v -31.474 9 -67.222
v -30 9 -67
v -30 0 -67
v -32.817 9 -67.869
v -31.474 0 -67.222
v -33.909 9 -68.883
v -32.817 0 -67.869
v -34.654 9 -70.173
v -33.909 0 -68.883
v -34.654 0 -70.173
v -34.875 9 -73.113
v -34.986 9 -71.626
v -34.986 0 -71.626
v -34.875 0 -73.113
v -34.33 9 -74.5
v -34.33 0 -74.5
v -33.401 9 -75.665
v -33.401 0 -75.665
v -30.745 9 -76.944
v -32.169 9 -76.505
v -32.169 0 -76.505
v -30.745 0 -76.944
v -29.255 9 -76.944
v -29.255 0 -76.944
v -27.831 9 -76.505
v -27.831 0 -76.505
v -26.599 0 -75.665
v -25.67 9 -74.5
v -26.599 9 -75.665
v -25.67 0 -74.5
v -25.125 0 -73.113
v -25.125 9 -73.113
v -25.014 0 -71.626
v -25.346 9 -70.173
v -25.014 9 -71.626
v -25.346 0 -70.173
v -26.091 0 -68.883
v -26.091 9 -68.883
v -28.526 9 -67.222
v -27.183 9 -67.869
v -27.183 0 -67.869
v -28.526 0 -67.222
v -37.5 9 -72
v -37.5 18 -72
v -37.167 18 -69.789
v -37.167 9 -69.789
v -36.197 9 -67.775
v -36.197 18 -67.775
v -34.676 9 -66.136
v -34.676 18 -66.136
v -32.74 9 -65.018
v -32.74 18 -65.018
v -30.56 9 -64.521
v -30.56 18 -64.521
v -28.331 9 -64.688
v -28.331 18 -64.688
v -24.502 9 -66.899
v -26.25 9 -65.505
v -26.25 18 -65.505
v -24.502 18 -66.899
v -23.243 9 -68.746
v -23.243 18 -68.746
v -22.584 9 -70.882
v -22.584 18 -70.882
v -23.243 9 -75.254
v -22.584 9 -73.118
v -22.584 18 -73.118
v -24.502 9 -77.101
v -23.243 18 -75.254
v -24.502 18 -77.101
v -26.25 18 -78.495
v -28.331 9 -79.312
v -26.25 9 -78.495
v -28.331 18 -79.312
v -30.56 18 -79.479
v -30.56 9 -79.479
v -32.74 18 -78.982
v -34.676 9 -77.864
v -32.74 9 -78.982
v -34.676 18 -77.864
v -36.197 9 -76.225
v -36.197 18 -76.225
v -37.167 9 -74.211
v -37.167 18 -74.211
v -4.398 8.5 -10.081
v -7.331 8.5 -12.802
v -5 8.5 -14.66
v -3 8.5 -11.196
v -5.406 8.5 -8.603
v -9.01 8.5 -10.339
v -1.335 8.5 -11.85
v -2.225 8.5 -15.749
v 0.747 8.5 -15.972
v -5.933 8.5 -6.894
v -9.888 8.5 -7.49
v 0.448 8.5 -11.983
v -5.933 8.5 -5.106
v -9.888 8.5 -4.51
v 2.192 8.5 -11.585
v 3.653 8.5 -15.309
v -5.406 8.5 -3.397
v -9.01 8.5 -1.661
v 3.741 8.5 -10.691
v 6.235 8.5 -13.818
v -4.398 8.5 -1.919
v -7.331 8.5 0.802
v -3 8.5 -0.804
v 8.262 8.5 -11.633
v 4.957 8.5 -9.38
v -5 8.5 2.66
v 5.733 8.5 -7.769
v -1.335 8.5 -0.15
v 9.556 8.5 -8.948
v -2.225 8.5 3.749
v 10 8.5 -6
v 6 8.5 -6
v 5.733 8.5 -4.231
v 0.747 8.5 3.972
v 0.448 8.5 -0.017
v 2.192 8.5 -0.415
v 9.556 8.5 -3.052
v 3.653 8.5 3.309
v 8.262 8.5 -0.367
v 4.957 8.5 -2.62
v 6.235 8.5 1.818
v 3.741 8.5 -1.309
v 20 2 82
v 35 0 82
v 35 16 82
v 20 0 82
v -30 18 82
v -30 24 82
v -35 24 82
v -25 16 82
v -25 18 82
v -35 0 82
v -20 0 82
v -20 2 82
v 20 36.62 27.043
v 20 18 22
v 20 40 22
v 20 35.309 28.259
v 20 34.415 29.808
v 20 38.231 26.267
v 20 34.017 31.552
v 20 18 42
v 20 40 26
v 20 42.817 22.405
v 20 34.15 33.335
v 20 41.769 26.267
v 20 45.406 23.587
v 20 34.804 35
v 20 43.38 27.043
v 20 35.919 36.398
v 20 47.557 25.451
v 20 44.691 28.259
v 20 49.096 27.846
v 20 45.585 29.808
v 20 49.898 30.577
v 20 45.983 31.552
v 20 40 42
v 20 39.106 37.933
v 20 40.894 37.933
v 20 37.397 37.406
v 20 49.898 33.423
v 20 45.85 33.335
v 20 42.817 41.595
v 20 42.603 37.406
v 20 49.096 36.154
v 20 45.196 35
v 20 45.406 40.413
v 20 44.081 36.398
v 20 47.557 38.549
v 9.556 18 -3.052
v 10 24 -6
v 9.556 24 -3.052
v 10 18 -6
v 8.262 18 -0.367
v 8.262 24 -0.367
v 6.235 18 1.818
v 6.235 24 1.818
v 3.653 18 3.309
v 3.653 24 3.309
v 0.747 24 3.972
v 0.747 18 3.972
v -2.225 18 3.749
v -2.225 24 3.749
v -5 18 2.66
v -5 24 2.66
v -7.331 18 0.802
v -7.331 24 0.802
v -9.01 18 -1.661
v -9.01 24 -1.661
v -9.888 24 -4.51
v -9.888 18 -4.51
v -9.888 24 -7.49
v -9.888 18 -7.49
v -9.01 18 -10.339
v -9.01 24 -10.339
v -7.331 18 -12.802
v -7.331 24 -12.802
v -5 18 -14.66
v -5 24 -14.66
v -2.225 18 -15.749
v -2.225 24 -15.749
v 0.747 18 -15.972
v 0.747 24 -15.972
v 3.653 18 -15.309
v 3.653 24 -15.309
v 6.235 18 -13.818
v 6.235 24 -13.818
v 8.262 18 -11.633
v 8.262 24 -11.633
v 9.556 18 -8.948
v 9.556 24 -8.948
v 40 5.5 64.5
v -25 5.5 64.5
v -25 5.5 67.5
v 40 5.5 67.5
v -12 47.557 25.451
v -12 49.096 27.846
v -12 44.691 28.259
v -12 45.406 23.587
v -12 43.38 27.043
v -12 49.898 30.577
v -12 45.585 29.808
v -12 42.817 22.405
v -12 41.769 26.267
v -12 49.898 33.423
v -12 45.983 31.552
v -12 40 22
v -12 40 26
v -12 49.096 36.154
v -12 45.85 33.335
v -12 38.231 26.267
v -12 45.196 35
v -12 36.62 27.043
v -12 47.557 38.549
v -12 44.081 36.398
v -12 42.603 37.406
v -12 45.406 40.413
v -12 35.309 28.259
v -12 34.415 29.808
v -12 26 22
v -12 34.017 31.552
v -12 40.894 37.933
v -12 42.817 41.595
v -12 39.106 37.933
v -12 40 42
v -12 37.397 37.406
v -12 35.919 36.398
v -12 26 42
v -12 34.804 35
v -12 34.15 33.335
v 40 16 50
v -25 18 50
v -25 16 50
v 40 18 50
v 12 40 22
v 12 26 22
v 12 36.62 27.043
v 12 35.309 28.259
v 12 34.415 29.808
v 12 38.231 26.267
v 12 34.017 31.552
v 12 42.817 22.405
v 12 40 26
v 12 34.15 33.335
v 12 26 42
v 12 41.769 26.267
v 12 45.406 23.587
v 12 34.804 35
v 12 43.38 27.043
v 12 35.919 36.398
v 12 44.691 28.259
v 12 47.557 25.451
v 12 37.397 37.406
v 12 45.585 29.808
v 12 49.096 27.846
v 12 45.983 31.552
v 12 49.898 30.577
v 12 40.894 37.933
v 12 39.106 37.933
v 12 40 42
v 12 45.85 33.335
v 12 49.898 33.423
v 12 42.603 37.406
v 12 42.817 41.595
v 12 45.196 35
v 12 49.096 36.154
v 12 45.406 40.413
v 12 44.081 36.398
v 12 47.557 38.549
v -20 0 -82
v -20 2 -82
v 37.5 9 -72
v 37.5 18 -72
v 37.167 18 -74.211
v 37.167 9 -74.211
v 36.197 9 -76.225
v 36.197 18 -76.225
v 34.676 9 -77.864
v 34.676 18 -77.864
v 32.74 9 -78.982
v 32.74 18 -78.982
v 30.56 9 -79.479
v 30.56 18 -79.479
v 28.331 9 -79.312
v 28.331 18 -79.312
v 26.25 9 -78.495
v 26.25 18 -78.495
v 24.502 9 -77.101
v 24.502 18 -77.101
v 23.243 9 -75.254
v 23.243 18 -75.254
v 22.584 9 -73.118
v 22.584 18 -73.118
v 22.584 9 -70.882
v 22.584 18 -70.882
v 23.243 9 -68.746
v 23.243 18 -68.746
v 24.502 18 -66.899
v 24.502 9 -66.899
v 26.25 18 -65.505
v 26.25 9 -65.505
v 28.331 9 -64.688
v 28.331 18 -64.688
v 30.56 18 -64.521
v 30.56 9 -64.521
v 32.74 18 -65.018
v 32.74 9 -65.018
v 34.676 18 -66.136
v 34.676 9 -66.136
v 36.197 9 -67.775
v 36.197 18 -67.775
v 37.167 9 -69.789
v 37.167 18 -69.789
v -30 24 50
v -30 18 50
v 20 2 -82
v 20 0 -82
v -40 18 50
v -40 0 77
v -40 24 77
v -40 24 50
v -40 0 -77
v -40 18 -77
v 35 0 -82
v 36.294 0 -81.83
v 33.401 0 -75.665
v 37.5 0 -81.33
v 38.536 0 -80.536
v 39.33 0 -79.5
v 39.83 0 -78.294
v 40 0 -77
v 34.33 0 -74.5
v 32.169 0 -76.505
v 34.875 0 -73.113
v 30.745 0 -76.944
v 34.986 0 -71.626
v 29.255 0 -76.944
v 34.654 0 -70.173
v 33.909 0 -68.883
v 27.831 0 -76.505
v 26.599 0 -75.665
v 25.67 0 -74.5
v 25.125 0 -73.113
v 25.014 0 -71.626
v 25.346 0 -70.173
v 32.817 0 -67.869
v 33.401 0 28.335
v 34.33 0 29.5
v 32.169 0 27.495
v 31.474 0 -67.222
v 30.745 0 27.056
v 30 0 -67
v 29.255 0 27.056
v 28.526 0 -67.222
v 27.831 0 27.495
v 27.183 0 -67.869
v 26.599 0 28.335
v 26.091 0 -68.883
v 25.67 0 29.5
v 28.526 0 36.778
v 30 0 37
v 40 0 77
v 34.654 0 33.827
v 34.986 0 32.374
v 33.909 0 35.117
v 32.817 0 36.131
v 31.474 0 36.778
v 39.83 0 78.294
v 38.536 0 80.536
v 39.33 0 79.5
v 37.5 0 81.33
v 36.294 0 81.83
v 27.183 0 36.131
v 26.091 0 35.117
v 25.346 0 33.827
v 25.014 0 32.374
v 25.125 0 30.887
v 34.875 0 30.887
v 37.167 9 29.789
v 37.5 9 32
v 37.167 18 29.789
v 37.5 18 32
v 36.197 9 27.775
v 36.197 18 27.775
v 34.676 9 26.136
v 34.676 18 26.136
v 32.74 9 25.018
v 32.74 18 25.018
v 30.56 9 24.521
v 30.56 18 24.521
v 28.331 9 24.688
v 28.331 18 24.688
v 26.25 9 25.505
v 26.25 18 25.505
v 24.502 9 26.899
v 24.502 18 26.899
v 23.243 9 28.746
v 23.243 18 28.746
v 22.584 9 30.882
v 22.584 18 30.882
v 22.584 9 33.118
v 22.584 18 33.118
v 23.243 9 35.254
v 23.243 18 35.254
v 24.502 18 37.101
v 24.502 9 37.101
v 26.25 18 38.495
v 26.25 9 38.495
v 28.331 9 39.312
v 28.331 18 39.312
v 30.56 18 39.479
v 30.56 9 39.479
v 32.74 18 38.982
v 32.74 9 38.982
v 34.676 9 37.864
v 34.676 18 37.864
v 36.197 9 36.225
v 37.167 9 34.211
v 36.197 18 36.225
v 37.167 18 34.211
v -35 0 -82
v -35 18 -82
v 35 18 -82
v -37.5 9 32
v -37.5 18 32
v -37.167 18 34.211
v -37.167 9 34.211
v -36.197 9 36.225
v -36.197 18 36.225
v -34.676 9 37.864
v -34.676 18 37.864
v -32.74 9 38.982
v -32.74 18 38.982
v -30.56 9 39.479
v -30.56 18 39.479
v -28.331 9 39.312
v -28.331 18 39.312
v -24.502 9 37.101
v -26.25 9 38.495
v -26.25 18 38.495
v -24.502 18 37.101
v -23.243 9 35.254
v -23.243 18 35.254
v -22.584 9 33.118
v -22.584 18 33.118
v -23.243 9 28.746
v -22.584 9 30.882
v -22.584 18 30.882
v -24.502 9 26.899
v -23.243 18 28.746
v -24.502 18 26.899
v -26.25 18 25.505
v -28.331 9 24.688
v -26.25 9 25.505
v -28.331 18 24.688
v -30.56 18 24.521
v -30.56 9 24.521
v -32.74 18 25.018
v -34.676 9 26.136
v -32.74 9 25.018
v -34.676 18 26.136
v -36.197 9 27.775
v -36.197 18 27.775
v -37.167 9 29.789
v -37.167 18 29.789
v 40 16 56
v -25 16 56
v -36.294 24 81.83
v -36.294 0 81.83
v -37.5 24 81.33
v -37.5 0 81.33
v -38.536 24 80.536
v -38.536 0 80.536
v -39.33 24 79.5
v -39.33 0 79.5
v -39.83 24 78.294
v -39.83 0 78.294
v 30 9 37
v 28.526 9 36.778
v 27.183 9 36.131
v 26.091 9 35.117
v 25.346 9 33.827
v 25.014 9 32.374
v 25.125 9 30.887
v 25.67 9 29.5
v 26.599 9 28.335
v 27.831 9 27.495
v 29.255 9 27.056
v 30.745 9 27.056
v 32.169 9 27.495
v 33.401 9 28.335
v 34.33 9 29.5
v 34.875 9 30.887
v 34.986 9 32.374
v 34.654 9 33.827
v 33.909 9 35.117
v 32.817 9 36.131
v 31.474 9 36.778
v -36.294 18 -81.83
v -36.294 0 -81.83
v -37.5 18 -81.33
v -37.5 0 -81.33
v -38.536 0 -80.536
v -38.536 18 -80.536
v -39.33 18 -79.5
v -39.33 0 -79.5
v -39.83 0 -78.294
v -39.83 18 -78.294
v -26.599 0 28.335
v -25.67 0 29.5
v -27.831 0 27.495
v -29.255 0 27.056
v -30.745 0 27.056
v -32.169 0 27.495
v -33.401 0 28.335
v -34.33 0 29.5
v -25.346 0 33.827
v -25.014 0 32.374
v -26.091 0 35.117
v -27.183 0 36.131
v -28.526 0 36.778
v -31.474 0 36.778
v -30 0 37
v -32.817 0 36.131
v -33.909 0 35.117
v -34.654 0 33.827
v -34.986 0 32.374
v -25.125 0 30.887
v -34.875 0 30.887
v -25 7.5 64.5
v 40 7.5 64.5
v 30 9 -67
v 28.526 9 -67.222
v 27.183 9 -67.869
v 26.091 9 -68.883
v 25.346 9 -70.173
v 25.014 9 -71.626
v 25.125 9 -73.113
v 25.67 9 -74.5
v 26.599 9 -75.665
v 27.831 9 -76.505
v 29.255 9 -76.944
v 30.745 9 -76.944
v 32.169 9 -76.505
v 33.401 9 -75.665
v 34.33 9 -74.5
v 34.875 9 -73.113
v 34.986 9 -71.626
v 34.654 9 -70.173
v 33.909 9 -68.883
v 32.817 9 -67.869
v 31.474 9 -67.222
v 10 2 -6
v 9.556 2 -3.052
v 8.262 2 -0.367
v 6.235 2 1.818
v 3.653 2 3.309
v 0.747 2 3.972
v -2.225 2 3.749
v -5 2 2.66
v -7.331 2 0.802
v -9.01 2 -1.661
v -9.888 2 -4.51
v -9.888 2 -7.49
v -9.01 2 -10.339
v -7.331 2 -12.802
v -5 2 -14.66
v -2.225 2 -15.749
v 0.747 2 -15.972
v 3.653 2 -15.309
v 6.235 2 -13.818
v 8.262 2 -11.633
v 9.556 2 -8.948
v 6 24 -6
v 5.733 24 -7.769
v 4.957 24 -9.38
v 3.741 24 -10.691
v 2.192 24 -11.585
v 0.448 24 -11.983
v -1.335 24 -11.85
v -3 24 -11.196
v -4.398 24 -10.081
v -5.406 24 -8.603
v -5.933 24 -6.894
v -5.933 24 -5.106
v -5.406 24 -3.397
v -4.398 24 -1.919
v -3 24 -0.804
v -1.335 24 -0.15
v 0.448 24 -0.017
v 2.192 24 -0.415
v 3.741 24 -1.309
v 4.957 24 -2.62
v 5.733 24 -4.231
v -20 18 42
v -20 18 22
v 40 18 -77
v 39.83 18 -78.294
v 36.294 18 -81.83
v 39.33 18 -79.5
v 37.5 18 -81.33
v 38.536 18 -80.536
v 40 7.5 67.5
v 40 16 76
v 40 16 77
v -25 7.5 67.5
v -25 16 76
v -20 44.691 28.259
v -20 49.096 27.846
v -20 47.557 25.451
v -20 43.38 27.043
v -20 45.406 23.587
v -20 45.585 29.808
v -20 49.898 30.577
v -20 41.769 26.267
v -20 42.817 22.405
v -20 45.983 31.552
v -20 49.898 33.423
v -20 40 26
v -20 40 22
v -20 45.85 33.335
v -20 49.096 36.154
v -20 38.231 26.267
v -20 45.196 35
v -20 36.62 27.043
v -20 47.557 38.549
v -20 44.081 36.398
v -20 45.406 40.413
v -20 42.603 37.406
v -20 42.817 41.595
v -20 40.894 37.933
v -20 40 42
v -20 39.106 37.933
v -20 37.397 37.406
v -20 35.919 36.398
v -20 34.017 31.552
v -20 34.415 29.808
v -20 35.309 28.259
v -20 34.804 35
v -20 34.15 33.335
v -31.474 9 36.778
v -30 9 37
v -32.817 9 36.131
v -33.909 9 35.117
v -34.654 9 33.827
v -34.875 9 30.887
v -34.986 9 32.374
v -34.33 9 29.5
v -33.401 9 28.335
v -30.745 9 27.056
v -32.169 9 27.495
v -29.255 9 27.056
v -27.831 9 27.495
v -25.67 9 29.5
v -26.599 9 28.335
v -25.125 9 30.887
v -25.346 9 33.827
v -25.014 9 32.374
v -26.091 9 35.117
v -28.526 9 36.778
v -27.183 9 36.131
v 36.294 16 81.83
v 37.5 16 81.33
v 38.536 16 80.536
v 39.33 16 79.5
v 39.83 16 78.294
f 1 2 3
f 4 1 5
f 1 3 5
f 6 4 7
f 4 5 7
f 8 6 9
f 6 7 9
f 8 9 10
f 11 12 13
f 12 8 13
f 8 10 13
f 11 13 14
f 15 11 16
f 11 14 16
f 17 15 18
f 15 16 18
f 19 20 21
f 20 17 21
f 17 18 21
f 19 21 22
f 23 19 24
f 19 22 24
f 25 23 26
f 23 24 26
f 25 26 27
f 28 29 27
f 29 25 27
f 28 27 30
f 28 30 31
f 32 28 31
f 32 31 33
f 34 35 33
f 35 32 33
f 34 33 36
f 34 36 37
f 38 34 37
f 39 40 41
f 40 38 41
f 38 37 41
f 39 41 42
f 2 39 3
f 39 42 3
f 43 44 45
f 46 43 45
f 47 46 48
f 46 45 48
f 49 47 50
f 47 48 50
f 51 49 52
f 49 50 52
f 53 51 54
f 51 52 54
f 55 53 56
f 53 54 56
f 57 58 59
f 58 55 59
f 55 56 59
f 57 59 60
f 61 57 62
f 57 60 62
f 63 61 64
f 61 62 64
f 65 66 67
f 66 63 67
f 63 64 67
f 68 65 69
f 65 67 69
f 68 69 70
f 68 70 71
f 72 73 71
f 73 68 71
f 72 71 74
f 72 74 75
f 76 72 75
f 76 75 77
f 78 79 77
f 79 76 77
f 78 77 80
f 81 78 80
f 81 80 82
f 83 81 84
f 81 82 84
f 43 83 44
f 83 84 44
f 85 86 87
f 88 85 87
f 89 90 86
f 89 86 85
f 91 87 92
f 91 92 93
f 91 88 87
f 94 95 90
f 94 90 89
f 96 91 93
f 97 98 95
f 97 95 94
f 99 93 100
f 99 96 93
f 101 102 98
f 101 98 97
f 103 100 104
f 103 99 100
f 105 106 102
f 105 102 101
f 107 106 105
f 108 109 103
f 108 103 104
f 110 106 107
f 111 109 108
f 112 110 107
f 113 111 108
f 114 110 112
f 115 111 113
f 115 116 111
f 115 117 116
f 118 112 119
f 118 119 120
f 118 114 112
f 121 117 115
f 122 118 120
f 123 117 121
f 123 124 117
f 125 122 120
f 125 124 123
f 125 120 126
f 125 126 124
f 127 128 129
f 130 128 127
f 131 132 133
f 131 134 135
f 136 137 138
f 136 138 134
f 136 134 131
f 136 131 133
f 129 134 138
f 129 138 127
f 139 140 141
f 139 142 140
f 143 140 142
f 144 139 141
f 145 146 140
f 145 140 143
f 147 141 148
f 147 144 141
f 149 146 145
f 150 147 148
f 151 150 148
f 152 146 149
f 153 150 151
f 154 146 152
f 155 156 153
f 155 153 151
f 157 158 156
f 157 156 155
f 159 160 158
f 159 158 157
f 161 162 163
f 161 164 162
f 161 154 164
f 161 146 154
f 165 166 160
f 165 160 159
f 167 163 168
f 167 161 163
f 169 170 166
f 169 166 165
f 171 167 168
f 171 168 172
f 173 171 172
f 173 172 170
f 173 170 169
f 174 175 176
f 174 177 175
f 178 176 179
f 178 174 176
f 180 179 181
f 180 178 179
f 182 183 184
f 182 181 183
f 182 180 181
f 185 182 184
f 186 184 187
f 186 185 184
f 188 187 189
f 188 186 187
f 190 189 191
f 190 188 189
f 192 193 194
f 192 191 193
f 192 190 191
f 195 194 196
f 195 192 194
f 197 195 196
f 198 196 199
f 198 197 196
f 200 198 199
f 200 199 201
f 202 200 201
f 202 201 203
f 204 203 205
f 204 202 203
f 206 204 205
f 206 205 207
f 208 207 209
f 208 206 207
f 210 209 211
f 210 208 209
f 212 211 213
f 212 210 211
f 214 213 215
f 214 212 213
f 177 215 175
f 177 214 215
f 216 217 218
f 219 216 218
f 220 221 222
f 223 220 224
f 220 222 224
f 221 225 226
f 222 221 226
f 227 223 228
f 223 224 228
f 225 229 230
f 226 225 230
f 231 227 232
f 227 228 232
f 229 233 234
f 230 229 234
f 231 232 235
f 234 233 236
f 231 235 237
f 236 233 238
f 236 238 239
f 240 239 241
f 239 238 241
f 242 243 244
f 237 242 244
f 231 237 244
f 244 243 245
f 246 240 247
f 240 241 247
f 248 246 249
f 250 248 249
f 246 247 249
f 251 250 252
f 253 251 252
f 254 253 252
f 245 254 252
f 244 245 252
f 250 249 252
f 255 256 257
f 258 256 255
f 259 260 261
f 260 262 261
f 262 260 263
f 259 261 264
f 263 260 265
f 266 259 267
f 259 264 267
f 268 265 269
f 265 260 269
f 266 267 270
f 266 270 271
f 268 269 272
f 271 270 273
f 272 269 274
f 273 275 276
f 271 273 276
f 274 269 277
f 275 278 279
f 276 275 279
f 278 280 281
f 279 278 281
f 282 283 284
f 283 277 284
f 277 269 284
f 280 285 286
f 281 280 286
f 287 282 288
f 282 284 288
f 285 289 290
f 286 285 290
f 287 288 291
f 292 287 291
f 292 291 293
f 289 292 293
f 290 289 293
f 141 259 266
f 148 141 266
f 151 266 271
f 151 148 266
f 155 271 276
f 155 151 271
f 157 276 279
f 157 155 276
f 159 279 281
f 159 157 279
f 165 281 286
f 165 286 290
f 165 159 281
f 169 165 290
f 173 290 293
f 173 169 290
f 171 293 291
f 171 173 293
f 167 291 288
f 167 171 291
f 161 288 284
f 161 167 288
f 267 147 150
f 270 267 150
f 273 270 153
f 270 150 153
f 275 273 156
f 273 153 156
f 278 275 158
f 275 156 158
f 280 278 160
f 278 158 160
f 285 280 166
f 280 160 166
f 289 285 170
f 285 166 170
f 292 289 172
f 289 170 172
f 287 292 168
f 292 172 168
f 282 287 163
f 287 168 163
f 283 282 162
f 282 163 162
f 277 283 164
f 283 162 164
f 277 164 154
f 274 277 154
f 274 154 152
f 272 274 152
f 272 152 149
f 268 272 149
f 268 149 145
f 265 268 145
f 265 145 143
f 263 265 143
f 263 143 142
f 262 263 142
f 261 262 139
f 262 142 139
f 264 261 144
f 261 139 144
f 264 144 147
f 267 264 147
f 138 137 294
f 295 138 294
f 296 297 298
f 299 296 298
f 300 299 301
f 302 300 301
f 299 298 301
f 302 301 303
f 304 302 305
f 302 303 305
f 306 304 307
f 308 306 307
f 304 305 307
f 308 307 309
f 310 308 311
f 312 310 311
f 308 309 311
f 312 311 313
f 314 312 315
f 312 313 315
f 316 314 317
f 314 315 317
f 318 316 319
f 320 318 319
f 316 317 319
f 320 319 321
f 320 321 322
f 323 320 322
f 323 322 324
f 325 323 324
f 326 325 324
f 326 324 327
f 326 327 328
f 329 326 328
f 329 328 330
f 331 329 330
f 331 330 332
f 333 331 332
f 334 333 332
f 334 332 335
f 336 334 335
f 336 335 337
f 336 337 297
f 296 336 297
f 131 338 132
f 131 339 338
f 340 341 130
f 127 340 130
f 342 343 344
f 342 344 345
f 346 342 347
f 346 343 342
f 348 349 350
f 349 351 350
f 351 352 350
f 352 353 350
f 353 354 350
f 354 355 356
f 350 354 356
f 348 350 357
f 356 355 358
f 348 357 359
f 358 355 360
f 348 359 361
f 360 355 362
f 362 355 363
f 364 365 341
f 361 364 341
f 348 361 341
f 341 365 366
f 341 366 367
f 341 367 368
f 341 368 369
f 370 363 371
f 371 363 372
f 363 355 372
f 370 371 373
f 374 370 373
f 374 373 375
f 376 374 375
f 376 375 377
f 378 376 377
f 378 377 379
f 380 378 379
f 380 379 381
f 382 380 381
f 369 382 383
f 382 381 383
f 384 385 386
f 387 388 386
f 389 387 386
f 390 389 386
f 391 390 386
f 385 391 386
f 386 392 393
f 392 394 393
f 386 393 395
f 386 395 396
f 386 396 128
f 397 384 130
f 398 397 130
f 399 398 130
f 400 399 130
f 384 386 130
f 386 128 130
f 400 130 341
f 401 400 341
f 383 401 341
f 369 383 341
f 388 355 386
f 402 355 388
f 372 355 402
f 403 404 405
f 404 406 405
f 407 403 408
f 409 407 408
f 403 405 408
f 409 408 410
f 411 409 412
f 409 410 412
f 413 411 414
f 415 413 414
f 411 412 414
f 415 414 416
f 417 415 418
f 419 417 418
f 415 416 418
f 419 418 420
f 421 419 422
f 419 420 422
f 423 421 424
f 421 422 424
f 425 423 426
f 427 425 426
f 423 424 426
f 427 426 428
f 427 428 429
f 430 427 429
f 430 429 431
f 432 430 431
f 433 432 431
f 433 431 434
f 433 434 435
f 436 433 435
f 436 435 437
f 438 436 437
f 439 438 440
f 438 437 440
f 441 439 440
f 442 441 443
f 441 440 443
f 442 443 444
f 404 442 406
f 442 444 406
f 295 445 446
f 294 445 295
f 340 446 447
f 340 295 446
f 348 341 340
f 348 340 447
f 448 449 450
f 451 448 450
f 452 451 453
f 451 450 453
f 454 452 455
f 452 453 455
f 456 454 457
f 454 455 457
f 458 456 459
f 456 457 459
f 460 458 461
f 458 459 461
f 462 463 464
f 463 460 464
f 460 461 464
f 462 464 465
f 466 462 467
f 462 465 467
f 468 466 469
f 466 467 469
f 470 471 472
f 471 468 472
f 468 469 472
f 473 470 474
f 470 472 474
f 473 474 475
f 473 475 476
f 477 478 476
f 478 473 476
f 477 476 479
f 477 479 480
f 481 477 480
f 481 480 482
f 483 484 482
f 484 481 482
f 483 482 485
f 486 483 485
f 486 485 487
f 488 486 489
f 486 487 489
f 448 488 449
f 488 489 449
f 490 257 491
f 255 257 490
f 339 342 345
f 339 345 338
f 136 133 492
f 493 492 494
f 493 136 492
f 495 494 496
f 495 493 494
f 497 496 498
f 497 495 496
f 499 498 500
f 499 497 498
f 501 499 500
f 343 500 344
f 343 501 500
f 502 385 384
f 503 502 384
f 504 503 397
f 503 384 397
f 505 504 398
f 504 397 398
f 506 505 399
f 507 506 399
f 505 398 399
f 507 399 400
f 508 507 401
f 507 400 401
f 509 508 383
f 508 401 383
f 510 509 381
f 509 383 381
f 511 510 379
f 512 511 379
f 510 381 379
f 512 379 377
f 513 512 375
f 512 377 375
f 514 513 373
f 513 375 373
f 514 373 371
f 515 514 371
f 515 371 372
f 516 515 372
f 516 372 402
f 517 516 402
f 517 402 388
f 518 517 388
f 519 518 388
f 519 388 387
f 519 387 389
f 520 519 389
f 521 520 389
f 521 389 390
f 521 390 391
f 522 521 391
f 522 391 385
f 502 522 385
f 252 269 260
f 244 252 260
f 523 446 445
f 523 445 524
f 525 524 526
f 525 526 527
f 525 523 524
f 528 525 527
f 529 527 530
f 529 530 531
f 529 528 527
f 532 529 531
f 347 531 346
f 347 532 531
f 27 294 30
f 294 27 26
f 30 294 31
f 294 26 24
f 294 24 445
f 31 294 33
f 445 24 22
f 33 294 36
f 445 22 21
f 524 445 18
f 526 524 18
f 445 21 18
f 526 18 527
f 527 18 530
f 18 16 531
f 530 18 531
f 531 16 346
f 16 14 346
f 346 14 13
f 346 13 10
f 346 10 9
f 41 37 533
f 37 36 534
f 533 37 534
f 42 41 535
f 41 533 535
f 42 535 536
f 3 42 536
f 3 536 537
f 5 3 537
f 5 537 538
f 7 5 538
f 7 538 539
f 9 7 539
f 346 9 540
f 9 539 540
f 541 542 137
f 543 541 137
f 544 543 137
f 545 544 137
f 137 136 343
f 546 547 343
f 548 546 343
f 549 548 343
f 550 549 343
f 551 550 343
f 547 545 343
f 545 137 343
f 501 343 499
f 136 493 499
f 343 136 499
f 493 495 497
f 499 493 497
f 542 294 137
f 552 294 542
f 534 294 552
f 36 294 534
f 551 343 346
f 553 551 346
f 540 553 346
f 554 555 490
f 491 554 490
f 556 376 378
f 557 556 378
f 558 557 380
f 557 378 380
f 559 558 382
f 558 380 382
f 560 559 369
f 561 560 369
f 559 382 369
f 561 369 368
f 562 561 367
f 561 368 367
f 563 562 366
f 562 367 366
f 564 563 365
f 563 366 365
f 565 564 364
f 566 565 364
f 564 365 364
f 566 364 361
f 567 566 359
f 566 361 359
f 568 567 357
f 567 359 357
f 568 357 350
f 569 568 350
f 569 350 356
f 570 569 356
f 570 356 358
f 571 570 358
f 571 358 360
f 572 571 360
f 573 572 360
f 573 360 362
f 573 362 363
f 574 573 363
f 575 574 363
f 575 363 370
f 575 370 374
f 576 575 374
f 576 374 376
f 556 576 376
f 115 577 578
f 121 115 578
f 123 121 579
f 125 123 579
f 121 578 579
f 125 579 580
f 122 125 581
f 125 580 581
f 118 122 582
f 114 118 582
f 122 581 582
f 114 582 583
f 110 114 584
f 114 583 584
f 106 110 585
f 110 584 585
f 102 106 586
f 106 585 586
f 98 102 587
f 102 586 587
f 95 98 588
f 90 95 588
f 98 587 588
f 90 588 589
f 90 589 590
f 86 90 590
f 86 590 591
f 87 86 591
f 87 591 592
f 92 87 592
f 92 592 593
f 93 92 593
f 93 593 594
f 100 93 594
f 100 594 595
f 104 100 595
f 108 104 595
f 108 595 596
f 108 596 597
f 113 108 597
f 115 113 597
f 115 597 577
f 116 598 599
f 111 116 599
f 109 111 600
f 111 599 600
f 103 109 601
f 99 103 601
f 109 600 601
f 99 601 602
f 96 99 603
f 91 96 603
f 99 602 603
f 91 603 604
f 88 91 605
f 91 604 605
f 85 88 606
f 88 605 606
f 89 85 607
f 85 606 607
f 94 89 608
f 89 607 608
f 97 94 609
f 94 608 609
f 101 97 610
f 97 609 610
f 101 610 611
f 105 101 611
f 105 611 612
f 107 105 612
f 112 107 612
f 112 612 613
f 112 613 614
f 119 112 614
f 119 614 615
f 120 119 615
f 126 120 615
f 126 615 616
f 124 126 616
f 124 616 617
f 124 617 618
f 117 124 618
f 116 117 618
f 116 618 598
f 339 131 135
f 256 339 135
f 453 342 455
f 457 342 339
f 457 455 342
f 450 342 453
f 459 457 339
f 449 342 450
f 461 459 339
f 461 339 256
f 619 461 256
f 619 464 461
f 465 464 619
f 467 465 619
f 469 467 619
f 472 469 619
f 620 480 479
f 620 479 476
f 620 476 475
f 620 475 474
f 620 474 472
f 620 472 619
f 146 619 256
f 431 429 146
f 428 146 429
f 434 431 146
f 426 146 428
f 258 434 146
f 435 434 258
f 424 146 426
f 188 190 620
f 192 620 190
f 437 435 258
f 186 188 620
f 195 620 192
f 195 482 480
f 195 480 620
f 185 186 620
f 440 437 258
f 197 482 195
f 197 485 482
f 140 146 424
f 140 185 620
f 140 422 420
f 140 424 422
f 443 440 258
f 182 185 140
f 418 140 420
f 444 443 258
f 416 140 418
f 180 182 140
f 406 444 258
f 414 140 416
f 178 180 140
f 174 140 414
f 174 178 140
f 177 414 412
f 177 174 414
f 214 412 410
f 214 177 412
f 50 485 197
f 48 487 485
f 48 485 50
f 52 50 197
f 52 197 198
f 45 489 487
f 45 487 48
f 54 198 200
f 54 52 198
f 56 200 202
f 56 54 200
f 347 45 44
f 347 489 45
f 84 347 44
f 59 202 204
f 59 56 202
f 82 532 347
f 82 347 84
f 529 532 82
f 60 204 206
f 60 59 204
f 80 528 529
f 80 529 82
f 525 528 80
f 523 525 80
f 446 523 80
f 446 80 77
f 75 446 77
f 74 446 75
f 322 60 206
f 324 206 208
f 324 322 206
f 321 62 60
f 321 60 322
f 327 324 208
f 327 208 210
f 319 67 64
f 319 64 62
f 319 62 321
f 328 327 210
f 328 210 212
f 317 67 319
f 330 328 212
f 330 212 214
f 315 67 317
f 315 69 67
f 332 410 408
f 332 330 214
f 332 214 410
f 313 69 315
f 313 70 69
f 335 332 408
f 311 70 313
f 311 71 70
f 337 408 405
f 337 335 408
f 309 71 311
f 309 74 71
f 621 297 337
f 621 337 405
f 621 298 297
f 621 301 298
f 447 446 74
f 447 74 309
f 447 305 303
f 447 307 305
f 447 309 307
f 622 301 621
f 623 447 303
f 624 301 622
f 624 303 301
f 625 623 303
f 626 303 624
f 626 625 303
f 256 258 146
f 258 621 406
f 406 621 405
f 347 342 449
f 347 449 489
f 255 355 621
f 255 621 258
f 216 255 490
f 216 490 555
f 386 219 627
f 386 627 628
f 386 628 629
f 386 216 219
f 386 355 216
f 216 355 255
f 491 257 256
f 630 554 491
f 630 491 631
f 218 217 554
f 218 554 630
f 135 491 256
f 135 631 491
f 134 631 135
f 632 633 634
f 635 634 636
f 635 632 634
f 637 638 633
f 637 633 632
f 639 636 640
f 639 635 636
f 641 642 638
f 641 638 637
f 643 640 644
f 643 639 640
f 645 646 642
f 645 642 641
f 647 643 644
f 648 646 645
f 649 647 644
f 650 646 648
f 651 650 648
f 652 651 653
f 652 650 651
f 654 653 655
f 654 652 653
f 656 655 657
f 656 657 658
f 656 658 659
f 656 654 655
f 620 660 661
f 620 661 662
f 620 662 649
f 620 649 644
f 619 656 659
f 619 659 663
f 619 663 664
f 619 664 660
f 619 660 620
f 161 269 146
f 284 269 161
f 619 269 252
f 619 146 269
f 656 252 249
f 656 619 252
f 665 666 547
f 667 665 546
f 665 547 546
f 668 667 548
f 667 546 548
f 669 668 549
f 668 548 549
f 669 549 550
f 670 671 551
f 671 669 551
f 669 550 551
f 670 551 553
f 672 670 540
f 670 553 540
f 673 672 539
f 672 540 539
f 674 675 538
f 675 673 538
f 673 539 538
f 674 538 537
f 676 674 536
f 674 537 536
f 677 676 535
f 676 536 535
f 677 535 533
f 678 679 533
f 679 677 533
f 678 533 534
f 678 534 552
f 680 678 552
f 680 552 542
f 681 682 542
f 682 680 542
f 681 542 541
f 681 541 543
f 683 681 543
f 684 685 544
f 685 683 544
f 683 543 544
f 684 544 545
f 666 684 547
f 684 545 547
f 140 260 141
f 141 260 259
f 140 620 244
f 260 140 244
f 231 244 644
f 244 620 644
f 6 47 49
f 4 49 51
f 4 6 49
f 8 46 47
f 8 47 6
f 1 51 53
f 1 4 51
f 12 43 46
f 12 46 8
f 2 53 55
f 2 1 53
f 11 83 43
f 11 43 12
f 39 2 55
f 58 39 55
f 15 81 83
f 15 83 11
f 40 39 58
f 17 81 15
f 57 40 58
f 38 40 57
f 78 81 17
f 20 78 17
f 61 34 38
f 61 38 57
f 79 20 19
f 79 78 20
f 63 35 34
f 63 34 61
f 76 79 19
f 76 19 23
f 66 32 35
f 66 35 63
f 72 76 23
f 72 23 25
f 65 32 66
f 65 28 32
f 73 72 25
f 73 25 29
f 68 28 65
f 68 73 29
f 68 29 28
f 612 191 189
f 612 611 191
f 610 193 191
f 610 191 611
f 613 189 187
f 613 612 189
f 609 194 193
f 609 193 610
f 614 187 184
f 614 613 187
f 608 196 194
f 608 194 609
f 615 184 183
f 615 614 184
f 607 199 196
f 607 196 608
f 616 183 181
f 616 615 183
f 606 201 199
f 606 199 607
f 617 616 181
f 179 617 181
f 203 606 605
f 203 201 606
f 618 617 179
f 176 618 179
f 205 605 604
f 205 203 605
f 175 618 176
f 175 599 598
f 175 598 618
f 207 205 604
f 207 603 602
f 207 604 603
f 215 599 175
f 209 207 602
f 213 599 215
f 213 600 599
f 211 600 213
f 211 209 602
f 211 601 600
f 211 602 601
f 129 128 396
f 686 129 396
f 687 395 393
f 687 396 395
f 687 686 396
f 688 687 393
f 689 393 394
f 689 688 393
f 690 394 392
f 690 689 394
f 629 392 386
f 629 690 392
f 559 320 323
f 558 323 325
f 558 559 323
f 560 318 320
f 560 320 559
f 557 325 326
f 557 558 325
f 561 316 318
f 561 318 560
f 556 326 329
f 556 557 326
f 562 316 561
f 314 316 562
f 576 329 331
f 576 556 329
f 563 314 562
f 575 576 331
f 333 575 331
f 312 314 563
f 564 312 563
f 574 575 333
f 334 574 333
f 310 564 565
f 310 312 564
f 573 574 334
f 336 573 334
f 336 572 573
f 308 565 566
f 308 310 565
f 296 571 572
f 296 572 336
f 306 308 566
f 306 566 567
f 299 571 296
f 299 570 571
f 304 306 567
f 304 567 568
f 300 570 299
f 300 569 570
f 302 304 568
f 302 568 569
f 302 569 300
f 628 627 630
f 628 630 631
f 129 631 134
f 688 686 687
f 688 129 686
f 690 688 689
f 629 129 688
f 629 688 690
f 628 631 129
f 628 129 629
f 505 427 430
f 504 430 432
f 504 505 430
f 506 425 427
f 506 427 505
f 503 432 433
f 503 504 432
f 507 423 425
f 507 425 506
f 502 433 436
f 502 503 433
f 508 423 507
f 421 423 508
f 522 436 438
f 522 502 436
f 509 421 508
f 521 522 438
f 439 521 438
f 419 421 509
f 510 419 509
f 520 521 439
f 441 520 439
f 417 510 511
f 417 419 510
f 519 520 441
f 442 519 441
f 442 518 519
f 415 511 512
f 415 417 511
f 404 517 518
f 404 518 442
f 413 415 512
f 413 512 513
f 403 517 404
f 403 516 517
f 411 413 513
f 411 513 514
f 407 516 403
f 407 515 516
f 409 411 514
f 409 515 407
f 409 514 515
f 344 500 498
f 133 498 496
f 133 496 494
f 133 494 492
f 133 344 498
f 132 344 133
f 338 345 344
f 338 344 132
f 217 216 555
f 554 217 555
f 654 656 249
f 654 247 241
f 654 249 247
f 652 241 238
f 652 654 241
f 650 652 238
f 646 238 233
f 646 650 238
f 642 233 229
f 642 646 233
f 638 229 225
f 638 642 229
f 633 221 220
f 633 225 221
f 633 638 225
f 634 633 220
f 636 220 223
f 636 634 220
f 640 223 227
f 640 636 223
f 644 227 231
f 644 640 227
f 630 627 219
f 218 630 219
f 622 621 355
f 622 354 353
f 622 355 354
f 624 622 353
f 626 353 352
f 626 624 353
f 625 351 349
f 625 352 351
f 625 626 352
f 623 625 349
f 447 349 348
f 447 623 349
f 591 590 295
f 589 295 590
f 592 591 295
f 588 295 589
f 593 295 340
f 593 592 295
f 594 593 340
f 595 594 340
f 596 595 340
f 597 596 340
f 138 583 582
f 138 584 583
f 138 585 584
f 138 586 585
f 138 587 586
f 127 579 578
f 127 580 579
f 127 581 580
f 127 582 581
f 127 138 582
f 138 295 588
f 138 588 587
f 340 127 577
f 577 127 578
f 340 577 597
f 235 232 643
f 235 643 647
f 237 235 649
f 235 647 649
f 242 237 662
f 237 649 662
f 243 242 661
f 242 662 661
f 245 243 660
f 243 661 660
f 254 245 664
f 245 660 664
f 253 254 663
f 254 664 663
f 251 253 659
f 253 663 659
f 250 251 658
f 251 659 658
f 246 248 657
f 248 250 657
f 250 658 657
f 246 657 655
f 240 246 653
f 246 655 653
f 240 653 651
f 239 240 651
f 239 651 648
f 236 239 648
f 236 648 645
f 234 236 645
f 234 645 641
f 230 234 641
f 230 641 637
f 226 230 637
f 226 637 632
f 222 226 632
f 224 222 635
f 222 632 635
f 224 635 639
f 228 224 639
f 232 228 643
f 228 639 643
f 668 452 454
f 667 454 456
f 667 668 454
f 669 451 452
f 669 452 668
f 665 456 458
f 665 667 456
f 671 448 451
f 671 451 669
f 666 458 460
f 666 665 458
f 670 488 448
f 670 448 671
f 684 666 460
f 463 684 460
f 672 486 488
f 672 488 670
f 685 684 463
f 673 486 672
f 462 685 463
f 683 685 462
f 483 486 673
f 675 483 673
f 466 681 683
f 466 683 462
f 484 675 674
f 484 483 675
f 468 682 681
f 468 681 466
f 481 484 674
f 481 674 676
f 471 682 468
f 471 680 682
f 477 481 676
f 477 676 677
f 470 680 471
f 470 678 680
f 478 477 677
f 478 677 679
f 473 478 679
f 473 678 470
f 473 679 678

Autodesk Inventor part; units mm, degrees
ref_plane "XZ Plane" through (0, 0, 0) normal (0, 1, 0) x (-1, 0, 0)
ref_plane "XY Plane" through (0, 0, 0) normal (0, 0, 1) x (1, 0, 0)
sketch "草图1" plane through (0, 0, 0) normal (0, 1, 0) x (-1, 0, 0)
  line L0 (40, -82) -> (-40, -82)
  line L1 (-40, -82) -> (-40, 82)
  line L2 (-40, 82) -> (40, 82)
  line L3 (40, 82) -> (40, -82)
  line L4 (40, -82) -> (-40, 82) construction
  line L5 (-40, -82) -> (40, 82) construction
  point P0 (0, 0)
  dimension "d0" = 80
  dimension "d1" = 164
extrude "拉伸1" add sketch "草图1" along normal blind 18
sketch "草图2" plane through (0, 18, 0) normal (0, 1, 0) x (1, 0, 0)
  line L0 (-40, -82) -> (40, -82) projected
  line L1 (-40, 82) -> (-40, -82) projected
  line L2 (-40, -82) -> (-40, -50)
  line L3 (-40, -50) -> (40, -50)
  line L4 (40, -50) -> (40, -82)
  line L5 (40, -82) -> (-40, -82)
  point P0 (0, 0)
  dimension "d4" = 32
extrude "拉伸2" cut sketch "草图2" against normal blind 2
fillet "圆角1" radius 5 4 edges at (40, 8, 82) (40, 9, -82) (-40, 8, 82) (-40, 9, -82)
sketch "草图4" plane through (0, 0, 0) normal (1, 0, 0) x (0, 1, 0)
  line L0 (0, 82) -> (16, 82) projected
  line L1 (5.5, 66) -> (5.5, 64.5)
  line L2 (5.5, 64.5) -> (5.5, 67.5)
  line L3 (5.5, 64.5) -> (7.5, 64.5)
  line L4 (7.5, 67.5) -> (5.5, 67.5)
  line L5 (7.5, 64.5) -> (16, 56)
  line L6 (16, 77) -> (16, 50) projected
  line L7 (7.5, 67.5) -> (16, 76)
  line L8 (16, 76) -> (16, 56)
  line L9 (5.5, 66) -> (6, 66)
  point P0 (0, 0)
  dimension "d15" = 16
  dimension "d16" = 1.5
  dimension "d17" = 3
  dimension "d18" = 2
extrude "拉伸3" cut sketch "草图4" along normal blind 40 and the other way blind 25
sketch "草图6" plane through (0, 16, 0) normal (0, 1, 0) x (1, 0, 0)
  line L0 (40, -76) -> (-25, -76) projected
  line L1 (-25, -76) -> (-25, -56) projected
  line L2 (-25, -56) -> (40, -56) projected
  line L3 (40, -50) -> (40, -56) projected
  line L4 (-40, -50) -> (40, -50) projected
  line L5 (-40, -77) -> (-40, -50) projected
  arc A0 (-40, -77) -> (-35, -82) centre (-35, -77) ccw projected
  line L6 (35, -82) -> (-35, -82) projected
  arc A1 (35, -82) -> (40, -77) centre (35, -77) ccw projected
  line L7 (40, -76) -> (40, -77) projected
  line L8 (-40, -50) -> (40, -50) projected
  line L9 (-40, -50) -> (-30, -50)
  line L10 (-30, -50) -> (-30, -82)
  line L11 (-35, -82) -> (35, -82) projected
  point P0 (0, 0)
  dimension "d27" = 10
extrude "拉伸5" add sketch "草图6" along normal blind 8 contours L6 A0 L5 L4 L10
sketch "草图7" plane through (0, 16, 0) normal (0, 1, 0) x (1, 0, 0)
  line L0 (-30, -50) -> (-30, -82) projected
  line L1 (35, -82) -> (-30, -82) projected
  arc A0 (35, -82) -> (40, -77) centre (35, -77) ccw projected
  line L2 (40, -76) -> (40, -77) projected
  line L3 (40, -76) -> (-25, -76) projected
  line L4 (-25, -76) -> (-25, -56) projected
  line L5 (-25, -56) -> (40, -56) projected
  line L6 (40, -50) -> (40, -56) projected
  line L7 (-30, -50) -> (40, -50) projected
  line L8 (-30, -50) -> (40, -50) projected
  line L9 (-25, -50) -> (-25, -82)
  line L10 (35, -82) -> (-30, -82) projected
  point P0 (0, 0)
extrude "拉伸6" add sketch "草图7" along normal blind 2 contours L7 L9 L4 L1 L0
sketch "草图8" plane through (0, 18, 0) normal (0, 1, 0) x (1, 0, 0)
  circle A0 centre (30, -32) radius 7.5
  line L0 (35, -82) -> (-25, -82) projected
  line L1 (40, -50) -> (40, 77) projected
  circle A1 centre (30, 72) radius 7.5
  line L2 (35, 82) -> (-35, 82) projected
  point P0 (0, 0)
  dimension "d32" = 15
  dimension "d34" = 10
  dimension "d35" = 15
  dimension "d36" = 10
  dimension "d38" = 50
extrude "拉伸7" cut sketch "草图8" against normal blind 9
sketch "草图9" plane through (30, 9, -72) normal (0, 1, 0) x (1, 0, 0)
  circle A0 centre (0, 0) radius 7.5 projected
  circle A1 centre (0, -104) radius 7.5 projected
  point P0 (-30, -72)
hole "孔1" at (30, 9, -72) at (30, 9, 32) direction (0, -1, 0) diameter 10 end through all
mirror "镜像1" about plane through (0, 0, 0) normal (1, 0, 0) of "拉伸7", "孔1"
sketch "草图11" plane through (0, 18, 0) normal (0, 1, 0) x (1, 0, 0)
  circle A0 centre (0, 6) radius 10
  line L0 (35, -82) -> (-25, -82) projected
  point P0 (0, 0)
  dimension "d50" = 20
  dimension "d51" = 88
extrude "拉伸8" add sketch "草图11" along normal blind 6
sketch "草图12" plane through (0, 24, -6) normal (0, 1, 0) x (1, 0, 0)
  circle A0 centre (0, 0) radius 6
  point P0 (0, -6)
  dimension "d54" = 12
extrude "拉伸9" cut sketch "草图12" against normal blind 15.5
sketch "草图13" plane through (0, 0, 0) normal (0, -1, 0) x (1, 0, 0)
  circle A0 centre (-30, -72) radius 5 projected
  circle A1 centre (-30, 32) radius 5 projected
  circle A2 centre (30, -72) radius 5 projected
  circle A3 centre (30, 32) radius 5 projected
  arc A4 (-40, -77) -> (-35, -82) centre (-35, -77) ccw projected
  line L0 (35, -82) -> (-35, -82) projected
  arc A5 (35, -82) -> (40, -77) centre (35, -77) ccw projected
  line L1 (40, 77) -> (40, -77) projected
  arc A6 (40, 77) -> (35, 82) centre (35, 77) ccw projected
  line L2 (-35, 82) -> (35, 82) projected
  arc A7 (-35, 82) -> (-40, 77) centre (-35, 77) ccw projected
  line L3 (-40, -77) -> (-40, 77) projected
  circle A8 centre (0, -6) radius 10
  point P0 (0, 0)
  dimension "d57" = 20
  dimension "d58" = 88
extrude "拉伸10" cut sketch "草图13" against normal up to surface (8.5 mm away) contours A8
ref_plane "工作平面1" through (20, 0, 0) normal (1, 0, 0) x (0, 1, 0)
sketch "草图15" plane through (20, 0, 0) normal (1, 0, 0) x (0, 1, 0)
  line L0 (18, 4) -> (18, -16) projected
  line L1 (18, -64.5) -> (18, -79.5) projected
  line L2 (18, 39.5) -> (18, 24.5) projected
  line L3 (18, 39.5) -> (18, 24.5) projected
  line L4 (18, -64.5) -> (18, -79.5) projected
  line L5 (18, -77) -> (18, -82) projected
  line L6 (18, -77) -> (18, 50) projected
  line L7 (18, 82) -> (18, 50) projected
  line L8 (18, 82) -> (18, 50) projected
  line L9 (18, 50) -> (18, -77) projected
  line L10 (18, -82) -> (18, -77) projected
  line L11 (18, 39.5) -> (18, 24.5) projected
  line L12 (16, 82) -> (0, 82) projected
  line L13 (18, 50) -> (18, -77) projected
  line L14 (18, 42) -> (40, 42)
  line L15 (40, 22) -> (18, 22)
  line L16 (18, 22) -> (18, 42)
  arc A0 (40, 22) -> (40, 42) centre (40, 32) ccw
  point P0 (0, 0)
  point P1 (18, 32)
  dimension "d62" = 50
  dimension "d63" = 10
  dimension "d66" = 20
  dimension "d67" = 22
extrude "拉伸11" add sketch "草图15" against normal blind 8
sketch "草图16" plane through (12, 0, 0) normal (-1, 0, 0) x (0, 0, 1)
  line L0 (22, 40) -> (22, 18) projected
  line L1 (22, 18) -> (22, 40) projected
  line L2 (42, 18) -> (22, 18) projected
  line L3 (22, 26) -> (42, 26)
  line L4 (42, 26) -> (42, 18)
  line L5 (42, 18) -> (22, 18)
  line L6 (22, 18) -> (22, 26)
  point P0 (0, 0)
  dimension "d70" = 8
extrude "拉伸12" add sketch "草图16" along normal blind 12
sketch "草图17" plane through (20, 0, 0) normal (1, 0, 0) x (0, 0, -1)
  line L0 (-42, 40) -> (-42, 18) projected
  line L1 (-22, 18) -> (-42, 18) projected
  line L2 (-22, 18) -> (-22, 40) projected
  arc A0 (-22, 40) -> (-42, 40) centre (-32, 40) ccw projected
  circle A1 centre (-32, 40) radius 6
  point P0 (0, 0)
  dimension "d73" = 12
extrude "拉伸13" cut sketch "草图17" against normal blind 8 contours A1
mirror "镜像2" about plane through (0, 0, 0) normal (1, 0, 0) of "拉伸11", "拉伸12", "拉伸13"
sketch "草图18" plane through (0, 0, 0) normal (0, -1, 0) x (1, 0, 0)
  line L0 (12, 22) -> (12, 42) projected
  circle A0 centre (0, -6) radius 10 projected
  circle A1 centre (-30, -72) radius 5 projected
  circle A2 centre (-30, 32) radius 5 projected
  circle A3 centre (30, -72) radius 5 projected
  circle A4 centre (30, 32) radius 5 projected
  arc A5 (-40, -77) -> (-35, -82) centre (-35, -77) ccw projected
  line L1 (35, -82) -> (-35, -82) projected
  arc A6 (35, -82) -> (40, -77) centre (35, -77) ccw projected
  line L2 (40, 77) -> (40, -77) projected
  arc A7 (40, 77) -> (35, 82) centre (35, 77) ccw projected
  line L3 (-35, 82) -> (35, 82) projected
  arc A8 (-35, 82) -> (-40, 77) centre (-35, 77) ccw projected
  line L4 (-40, -77) -> (-40, 77) projected
  line L5 (-35, 82) -> (35, 82) projected
  line L6 (35, -82) -> (-35, -82) projected
  line L7 (20, 82) -> (-20, 82)
  line L8 (-20, 82) -> (-20, -82)
  line L9 (-20, -82) -> (20, -82)
  line L10 (20, -82) -> (20, 82)
  point P0 (0, 0)
  dimension "d76" = 20
  dimension "d77" = 40
extrude "拉伸14" cut sketch "草图18" against normal blind 2 contours L8 L3 L10 L1
properties part number "4-上盖" material "灰口铁"
